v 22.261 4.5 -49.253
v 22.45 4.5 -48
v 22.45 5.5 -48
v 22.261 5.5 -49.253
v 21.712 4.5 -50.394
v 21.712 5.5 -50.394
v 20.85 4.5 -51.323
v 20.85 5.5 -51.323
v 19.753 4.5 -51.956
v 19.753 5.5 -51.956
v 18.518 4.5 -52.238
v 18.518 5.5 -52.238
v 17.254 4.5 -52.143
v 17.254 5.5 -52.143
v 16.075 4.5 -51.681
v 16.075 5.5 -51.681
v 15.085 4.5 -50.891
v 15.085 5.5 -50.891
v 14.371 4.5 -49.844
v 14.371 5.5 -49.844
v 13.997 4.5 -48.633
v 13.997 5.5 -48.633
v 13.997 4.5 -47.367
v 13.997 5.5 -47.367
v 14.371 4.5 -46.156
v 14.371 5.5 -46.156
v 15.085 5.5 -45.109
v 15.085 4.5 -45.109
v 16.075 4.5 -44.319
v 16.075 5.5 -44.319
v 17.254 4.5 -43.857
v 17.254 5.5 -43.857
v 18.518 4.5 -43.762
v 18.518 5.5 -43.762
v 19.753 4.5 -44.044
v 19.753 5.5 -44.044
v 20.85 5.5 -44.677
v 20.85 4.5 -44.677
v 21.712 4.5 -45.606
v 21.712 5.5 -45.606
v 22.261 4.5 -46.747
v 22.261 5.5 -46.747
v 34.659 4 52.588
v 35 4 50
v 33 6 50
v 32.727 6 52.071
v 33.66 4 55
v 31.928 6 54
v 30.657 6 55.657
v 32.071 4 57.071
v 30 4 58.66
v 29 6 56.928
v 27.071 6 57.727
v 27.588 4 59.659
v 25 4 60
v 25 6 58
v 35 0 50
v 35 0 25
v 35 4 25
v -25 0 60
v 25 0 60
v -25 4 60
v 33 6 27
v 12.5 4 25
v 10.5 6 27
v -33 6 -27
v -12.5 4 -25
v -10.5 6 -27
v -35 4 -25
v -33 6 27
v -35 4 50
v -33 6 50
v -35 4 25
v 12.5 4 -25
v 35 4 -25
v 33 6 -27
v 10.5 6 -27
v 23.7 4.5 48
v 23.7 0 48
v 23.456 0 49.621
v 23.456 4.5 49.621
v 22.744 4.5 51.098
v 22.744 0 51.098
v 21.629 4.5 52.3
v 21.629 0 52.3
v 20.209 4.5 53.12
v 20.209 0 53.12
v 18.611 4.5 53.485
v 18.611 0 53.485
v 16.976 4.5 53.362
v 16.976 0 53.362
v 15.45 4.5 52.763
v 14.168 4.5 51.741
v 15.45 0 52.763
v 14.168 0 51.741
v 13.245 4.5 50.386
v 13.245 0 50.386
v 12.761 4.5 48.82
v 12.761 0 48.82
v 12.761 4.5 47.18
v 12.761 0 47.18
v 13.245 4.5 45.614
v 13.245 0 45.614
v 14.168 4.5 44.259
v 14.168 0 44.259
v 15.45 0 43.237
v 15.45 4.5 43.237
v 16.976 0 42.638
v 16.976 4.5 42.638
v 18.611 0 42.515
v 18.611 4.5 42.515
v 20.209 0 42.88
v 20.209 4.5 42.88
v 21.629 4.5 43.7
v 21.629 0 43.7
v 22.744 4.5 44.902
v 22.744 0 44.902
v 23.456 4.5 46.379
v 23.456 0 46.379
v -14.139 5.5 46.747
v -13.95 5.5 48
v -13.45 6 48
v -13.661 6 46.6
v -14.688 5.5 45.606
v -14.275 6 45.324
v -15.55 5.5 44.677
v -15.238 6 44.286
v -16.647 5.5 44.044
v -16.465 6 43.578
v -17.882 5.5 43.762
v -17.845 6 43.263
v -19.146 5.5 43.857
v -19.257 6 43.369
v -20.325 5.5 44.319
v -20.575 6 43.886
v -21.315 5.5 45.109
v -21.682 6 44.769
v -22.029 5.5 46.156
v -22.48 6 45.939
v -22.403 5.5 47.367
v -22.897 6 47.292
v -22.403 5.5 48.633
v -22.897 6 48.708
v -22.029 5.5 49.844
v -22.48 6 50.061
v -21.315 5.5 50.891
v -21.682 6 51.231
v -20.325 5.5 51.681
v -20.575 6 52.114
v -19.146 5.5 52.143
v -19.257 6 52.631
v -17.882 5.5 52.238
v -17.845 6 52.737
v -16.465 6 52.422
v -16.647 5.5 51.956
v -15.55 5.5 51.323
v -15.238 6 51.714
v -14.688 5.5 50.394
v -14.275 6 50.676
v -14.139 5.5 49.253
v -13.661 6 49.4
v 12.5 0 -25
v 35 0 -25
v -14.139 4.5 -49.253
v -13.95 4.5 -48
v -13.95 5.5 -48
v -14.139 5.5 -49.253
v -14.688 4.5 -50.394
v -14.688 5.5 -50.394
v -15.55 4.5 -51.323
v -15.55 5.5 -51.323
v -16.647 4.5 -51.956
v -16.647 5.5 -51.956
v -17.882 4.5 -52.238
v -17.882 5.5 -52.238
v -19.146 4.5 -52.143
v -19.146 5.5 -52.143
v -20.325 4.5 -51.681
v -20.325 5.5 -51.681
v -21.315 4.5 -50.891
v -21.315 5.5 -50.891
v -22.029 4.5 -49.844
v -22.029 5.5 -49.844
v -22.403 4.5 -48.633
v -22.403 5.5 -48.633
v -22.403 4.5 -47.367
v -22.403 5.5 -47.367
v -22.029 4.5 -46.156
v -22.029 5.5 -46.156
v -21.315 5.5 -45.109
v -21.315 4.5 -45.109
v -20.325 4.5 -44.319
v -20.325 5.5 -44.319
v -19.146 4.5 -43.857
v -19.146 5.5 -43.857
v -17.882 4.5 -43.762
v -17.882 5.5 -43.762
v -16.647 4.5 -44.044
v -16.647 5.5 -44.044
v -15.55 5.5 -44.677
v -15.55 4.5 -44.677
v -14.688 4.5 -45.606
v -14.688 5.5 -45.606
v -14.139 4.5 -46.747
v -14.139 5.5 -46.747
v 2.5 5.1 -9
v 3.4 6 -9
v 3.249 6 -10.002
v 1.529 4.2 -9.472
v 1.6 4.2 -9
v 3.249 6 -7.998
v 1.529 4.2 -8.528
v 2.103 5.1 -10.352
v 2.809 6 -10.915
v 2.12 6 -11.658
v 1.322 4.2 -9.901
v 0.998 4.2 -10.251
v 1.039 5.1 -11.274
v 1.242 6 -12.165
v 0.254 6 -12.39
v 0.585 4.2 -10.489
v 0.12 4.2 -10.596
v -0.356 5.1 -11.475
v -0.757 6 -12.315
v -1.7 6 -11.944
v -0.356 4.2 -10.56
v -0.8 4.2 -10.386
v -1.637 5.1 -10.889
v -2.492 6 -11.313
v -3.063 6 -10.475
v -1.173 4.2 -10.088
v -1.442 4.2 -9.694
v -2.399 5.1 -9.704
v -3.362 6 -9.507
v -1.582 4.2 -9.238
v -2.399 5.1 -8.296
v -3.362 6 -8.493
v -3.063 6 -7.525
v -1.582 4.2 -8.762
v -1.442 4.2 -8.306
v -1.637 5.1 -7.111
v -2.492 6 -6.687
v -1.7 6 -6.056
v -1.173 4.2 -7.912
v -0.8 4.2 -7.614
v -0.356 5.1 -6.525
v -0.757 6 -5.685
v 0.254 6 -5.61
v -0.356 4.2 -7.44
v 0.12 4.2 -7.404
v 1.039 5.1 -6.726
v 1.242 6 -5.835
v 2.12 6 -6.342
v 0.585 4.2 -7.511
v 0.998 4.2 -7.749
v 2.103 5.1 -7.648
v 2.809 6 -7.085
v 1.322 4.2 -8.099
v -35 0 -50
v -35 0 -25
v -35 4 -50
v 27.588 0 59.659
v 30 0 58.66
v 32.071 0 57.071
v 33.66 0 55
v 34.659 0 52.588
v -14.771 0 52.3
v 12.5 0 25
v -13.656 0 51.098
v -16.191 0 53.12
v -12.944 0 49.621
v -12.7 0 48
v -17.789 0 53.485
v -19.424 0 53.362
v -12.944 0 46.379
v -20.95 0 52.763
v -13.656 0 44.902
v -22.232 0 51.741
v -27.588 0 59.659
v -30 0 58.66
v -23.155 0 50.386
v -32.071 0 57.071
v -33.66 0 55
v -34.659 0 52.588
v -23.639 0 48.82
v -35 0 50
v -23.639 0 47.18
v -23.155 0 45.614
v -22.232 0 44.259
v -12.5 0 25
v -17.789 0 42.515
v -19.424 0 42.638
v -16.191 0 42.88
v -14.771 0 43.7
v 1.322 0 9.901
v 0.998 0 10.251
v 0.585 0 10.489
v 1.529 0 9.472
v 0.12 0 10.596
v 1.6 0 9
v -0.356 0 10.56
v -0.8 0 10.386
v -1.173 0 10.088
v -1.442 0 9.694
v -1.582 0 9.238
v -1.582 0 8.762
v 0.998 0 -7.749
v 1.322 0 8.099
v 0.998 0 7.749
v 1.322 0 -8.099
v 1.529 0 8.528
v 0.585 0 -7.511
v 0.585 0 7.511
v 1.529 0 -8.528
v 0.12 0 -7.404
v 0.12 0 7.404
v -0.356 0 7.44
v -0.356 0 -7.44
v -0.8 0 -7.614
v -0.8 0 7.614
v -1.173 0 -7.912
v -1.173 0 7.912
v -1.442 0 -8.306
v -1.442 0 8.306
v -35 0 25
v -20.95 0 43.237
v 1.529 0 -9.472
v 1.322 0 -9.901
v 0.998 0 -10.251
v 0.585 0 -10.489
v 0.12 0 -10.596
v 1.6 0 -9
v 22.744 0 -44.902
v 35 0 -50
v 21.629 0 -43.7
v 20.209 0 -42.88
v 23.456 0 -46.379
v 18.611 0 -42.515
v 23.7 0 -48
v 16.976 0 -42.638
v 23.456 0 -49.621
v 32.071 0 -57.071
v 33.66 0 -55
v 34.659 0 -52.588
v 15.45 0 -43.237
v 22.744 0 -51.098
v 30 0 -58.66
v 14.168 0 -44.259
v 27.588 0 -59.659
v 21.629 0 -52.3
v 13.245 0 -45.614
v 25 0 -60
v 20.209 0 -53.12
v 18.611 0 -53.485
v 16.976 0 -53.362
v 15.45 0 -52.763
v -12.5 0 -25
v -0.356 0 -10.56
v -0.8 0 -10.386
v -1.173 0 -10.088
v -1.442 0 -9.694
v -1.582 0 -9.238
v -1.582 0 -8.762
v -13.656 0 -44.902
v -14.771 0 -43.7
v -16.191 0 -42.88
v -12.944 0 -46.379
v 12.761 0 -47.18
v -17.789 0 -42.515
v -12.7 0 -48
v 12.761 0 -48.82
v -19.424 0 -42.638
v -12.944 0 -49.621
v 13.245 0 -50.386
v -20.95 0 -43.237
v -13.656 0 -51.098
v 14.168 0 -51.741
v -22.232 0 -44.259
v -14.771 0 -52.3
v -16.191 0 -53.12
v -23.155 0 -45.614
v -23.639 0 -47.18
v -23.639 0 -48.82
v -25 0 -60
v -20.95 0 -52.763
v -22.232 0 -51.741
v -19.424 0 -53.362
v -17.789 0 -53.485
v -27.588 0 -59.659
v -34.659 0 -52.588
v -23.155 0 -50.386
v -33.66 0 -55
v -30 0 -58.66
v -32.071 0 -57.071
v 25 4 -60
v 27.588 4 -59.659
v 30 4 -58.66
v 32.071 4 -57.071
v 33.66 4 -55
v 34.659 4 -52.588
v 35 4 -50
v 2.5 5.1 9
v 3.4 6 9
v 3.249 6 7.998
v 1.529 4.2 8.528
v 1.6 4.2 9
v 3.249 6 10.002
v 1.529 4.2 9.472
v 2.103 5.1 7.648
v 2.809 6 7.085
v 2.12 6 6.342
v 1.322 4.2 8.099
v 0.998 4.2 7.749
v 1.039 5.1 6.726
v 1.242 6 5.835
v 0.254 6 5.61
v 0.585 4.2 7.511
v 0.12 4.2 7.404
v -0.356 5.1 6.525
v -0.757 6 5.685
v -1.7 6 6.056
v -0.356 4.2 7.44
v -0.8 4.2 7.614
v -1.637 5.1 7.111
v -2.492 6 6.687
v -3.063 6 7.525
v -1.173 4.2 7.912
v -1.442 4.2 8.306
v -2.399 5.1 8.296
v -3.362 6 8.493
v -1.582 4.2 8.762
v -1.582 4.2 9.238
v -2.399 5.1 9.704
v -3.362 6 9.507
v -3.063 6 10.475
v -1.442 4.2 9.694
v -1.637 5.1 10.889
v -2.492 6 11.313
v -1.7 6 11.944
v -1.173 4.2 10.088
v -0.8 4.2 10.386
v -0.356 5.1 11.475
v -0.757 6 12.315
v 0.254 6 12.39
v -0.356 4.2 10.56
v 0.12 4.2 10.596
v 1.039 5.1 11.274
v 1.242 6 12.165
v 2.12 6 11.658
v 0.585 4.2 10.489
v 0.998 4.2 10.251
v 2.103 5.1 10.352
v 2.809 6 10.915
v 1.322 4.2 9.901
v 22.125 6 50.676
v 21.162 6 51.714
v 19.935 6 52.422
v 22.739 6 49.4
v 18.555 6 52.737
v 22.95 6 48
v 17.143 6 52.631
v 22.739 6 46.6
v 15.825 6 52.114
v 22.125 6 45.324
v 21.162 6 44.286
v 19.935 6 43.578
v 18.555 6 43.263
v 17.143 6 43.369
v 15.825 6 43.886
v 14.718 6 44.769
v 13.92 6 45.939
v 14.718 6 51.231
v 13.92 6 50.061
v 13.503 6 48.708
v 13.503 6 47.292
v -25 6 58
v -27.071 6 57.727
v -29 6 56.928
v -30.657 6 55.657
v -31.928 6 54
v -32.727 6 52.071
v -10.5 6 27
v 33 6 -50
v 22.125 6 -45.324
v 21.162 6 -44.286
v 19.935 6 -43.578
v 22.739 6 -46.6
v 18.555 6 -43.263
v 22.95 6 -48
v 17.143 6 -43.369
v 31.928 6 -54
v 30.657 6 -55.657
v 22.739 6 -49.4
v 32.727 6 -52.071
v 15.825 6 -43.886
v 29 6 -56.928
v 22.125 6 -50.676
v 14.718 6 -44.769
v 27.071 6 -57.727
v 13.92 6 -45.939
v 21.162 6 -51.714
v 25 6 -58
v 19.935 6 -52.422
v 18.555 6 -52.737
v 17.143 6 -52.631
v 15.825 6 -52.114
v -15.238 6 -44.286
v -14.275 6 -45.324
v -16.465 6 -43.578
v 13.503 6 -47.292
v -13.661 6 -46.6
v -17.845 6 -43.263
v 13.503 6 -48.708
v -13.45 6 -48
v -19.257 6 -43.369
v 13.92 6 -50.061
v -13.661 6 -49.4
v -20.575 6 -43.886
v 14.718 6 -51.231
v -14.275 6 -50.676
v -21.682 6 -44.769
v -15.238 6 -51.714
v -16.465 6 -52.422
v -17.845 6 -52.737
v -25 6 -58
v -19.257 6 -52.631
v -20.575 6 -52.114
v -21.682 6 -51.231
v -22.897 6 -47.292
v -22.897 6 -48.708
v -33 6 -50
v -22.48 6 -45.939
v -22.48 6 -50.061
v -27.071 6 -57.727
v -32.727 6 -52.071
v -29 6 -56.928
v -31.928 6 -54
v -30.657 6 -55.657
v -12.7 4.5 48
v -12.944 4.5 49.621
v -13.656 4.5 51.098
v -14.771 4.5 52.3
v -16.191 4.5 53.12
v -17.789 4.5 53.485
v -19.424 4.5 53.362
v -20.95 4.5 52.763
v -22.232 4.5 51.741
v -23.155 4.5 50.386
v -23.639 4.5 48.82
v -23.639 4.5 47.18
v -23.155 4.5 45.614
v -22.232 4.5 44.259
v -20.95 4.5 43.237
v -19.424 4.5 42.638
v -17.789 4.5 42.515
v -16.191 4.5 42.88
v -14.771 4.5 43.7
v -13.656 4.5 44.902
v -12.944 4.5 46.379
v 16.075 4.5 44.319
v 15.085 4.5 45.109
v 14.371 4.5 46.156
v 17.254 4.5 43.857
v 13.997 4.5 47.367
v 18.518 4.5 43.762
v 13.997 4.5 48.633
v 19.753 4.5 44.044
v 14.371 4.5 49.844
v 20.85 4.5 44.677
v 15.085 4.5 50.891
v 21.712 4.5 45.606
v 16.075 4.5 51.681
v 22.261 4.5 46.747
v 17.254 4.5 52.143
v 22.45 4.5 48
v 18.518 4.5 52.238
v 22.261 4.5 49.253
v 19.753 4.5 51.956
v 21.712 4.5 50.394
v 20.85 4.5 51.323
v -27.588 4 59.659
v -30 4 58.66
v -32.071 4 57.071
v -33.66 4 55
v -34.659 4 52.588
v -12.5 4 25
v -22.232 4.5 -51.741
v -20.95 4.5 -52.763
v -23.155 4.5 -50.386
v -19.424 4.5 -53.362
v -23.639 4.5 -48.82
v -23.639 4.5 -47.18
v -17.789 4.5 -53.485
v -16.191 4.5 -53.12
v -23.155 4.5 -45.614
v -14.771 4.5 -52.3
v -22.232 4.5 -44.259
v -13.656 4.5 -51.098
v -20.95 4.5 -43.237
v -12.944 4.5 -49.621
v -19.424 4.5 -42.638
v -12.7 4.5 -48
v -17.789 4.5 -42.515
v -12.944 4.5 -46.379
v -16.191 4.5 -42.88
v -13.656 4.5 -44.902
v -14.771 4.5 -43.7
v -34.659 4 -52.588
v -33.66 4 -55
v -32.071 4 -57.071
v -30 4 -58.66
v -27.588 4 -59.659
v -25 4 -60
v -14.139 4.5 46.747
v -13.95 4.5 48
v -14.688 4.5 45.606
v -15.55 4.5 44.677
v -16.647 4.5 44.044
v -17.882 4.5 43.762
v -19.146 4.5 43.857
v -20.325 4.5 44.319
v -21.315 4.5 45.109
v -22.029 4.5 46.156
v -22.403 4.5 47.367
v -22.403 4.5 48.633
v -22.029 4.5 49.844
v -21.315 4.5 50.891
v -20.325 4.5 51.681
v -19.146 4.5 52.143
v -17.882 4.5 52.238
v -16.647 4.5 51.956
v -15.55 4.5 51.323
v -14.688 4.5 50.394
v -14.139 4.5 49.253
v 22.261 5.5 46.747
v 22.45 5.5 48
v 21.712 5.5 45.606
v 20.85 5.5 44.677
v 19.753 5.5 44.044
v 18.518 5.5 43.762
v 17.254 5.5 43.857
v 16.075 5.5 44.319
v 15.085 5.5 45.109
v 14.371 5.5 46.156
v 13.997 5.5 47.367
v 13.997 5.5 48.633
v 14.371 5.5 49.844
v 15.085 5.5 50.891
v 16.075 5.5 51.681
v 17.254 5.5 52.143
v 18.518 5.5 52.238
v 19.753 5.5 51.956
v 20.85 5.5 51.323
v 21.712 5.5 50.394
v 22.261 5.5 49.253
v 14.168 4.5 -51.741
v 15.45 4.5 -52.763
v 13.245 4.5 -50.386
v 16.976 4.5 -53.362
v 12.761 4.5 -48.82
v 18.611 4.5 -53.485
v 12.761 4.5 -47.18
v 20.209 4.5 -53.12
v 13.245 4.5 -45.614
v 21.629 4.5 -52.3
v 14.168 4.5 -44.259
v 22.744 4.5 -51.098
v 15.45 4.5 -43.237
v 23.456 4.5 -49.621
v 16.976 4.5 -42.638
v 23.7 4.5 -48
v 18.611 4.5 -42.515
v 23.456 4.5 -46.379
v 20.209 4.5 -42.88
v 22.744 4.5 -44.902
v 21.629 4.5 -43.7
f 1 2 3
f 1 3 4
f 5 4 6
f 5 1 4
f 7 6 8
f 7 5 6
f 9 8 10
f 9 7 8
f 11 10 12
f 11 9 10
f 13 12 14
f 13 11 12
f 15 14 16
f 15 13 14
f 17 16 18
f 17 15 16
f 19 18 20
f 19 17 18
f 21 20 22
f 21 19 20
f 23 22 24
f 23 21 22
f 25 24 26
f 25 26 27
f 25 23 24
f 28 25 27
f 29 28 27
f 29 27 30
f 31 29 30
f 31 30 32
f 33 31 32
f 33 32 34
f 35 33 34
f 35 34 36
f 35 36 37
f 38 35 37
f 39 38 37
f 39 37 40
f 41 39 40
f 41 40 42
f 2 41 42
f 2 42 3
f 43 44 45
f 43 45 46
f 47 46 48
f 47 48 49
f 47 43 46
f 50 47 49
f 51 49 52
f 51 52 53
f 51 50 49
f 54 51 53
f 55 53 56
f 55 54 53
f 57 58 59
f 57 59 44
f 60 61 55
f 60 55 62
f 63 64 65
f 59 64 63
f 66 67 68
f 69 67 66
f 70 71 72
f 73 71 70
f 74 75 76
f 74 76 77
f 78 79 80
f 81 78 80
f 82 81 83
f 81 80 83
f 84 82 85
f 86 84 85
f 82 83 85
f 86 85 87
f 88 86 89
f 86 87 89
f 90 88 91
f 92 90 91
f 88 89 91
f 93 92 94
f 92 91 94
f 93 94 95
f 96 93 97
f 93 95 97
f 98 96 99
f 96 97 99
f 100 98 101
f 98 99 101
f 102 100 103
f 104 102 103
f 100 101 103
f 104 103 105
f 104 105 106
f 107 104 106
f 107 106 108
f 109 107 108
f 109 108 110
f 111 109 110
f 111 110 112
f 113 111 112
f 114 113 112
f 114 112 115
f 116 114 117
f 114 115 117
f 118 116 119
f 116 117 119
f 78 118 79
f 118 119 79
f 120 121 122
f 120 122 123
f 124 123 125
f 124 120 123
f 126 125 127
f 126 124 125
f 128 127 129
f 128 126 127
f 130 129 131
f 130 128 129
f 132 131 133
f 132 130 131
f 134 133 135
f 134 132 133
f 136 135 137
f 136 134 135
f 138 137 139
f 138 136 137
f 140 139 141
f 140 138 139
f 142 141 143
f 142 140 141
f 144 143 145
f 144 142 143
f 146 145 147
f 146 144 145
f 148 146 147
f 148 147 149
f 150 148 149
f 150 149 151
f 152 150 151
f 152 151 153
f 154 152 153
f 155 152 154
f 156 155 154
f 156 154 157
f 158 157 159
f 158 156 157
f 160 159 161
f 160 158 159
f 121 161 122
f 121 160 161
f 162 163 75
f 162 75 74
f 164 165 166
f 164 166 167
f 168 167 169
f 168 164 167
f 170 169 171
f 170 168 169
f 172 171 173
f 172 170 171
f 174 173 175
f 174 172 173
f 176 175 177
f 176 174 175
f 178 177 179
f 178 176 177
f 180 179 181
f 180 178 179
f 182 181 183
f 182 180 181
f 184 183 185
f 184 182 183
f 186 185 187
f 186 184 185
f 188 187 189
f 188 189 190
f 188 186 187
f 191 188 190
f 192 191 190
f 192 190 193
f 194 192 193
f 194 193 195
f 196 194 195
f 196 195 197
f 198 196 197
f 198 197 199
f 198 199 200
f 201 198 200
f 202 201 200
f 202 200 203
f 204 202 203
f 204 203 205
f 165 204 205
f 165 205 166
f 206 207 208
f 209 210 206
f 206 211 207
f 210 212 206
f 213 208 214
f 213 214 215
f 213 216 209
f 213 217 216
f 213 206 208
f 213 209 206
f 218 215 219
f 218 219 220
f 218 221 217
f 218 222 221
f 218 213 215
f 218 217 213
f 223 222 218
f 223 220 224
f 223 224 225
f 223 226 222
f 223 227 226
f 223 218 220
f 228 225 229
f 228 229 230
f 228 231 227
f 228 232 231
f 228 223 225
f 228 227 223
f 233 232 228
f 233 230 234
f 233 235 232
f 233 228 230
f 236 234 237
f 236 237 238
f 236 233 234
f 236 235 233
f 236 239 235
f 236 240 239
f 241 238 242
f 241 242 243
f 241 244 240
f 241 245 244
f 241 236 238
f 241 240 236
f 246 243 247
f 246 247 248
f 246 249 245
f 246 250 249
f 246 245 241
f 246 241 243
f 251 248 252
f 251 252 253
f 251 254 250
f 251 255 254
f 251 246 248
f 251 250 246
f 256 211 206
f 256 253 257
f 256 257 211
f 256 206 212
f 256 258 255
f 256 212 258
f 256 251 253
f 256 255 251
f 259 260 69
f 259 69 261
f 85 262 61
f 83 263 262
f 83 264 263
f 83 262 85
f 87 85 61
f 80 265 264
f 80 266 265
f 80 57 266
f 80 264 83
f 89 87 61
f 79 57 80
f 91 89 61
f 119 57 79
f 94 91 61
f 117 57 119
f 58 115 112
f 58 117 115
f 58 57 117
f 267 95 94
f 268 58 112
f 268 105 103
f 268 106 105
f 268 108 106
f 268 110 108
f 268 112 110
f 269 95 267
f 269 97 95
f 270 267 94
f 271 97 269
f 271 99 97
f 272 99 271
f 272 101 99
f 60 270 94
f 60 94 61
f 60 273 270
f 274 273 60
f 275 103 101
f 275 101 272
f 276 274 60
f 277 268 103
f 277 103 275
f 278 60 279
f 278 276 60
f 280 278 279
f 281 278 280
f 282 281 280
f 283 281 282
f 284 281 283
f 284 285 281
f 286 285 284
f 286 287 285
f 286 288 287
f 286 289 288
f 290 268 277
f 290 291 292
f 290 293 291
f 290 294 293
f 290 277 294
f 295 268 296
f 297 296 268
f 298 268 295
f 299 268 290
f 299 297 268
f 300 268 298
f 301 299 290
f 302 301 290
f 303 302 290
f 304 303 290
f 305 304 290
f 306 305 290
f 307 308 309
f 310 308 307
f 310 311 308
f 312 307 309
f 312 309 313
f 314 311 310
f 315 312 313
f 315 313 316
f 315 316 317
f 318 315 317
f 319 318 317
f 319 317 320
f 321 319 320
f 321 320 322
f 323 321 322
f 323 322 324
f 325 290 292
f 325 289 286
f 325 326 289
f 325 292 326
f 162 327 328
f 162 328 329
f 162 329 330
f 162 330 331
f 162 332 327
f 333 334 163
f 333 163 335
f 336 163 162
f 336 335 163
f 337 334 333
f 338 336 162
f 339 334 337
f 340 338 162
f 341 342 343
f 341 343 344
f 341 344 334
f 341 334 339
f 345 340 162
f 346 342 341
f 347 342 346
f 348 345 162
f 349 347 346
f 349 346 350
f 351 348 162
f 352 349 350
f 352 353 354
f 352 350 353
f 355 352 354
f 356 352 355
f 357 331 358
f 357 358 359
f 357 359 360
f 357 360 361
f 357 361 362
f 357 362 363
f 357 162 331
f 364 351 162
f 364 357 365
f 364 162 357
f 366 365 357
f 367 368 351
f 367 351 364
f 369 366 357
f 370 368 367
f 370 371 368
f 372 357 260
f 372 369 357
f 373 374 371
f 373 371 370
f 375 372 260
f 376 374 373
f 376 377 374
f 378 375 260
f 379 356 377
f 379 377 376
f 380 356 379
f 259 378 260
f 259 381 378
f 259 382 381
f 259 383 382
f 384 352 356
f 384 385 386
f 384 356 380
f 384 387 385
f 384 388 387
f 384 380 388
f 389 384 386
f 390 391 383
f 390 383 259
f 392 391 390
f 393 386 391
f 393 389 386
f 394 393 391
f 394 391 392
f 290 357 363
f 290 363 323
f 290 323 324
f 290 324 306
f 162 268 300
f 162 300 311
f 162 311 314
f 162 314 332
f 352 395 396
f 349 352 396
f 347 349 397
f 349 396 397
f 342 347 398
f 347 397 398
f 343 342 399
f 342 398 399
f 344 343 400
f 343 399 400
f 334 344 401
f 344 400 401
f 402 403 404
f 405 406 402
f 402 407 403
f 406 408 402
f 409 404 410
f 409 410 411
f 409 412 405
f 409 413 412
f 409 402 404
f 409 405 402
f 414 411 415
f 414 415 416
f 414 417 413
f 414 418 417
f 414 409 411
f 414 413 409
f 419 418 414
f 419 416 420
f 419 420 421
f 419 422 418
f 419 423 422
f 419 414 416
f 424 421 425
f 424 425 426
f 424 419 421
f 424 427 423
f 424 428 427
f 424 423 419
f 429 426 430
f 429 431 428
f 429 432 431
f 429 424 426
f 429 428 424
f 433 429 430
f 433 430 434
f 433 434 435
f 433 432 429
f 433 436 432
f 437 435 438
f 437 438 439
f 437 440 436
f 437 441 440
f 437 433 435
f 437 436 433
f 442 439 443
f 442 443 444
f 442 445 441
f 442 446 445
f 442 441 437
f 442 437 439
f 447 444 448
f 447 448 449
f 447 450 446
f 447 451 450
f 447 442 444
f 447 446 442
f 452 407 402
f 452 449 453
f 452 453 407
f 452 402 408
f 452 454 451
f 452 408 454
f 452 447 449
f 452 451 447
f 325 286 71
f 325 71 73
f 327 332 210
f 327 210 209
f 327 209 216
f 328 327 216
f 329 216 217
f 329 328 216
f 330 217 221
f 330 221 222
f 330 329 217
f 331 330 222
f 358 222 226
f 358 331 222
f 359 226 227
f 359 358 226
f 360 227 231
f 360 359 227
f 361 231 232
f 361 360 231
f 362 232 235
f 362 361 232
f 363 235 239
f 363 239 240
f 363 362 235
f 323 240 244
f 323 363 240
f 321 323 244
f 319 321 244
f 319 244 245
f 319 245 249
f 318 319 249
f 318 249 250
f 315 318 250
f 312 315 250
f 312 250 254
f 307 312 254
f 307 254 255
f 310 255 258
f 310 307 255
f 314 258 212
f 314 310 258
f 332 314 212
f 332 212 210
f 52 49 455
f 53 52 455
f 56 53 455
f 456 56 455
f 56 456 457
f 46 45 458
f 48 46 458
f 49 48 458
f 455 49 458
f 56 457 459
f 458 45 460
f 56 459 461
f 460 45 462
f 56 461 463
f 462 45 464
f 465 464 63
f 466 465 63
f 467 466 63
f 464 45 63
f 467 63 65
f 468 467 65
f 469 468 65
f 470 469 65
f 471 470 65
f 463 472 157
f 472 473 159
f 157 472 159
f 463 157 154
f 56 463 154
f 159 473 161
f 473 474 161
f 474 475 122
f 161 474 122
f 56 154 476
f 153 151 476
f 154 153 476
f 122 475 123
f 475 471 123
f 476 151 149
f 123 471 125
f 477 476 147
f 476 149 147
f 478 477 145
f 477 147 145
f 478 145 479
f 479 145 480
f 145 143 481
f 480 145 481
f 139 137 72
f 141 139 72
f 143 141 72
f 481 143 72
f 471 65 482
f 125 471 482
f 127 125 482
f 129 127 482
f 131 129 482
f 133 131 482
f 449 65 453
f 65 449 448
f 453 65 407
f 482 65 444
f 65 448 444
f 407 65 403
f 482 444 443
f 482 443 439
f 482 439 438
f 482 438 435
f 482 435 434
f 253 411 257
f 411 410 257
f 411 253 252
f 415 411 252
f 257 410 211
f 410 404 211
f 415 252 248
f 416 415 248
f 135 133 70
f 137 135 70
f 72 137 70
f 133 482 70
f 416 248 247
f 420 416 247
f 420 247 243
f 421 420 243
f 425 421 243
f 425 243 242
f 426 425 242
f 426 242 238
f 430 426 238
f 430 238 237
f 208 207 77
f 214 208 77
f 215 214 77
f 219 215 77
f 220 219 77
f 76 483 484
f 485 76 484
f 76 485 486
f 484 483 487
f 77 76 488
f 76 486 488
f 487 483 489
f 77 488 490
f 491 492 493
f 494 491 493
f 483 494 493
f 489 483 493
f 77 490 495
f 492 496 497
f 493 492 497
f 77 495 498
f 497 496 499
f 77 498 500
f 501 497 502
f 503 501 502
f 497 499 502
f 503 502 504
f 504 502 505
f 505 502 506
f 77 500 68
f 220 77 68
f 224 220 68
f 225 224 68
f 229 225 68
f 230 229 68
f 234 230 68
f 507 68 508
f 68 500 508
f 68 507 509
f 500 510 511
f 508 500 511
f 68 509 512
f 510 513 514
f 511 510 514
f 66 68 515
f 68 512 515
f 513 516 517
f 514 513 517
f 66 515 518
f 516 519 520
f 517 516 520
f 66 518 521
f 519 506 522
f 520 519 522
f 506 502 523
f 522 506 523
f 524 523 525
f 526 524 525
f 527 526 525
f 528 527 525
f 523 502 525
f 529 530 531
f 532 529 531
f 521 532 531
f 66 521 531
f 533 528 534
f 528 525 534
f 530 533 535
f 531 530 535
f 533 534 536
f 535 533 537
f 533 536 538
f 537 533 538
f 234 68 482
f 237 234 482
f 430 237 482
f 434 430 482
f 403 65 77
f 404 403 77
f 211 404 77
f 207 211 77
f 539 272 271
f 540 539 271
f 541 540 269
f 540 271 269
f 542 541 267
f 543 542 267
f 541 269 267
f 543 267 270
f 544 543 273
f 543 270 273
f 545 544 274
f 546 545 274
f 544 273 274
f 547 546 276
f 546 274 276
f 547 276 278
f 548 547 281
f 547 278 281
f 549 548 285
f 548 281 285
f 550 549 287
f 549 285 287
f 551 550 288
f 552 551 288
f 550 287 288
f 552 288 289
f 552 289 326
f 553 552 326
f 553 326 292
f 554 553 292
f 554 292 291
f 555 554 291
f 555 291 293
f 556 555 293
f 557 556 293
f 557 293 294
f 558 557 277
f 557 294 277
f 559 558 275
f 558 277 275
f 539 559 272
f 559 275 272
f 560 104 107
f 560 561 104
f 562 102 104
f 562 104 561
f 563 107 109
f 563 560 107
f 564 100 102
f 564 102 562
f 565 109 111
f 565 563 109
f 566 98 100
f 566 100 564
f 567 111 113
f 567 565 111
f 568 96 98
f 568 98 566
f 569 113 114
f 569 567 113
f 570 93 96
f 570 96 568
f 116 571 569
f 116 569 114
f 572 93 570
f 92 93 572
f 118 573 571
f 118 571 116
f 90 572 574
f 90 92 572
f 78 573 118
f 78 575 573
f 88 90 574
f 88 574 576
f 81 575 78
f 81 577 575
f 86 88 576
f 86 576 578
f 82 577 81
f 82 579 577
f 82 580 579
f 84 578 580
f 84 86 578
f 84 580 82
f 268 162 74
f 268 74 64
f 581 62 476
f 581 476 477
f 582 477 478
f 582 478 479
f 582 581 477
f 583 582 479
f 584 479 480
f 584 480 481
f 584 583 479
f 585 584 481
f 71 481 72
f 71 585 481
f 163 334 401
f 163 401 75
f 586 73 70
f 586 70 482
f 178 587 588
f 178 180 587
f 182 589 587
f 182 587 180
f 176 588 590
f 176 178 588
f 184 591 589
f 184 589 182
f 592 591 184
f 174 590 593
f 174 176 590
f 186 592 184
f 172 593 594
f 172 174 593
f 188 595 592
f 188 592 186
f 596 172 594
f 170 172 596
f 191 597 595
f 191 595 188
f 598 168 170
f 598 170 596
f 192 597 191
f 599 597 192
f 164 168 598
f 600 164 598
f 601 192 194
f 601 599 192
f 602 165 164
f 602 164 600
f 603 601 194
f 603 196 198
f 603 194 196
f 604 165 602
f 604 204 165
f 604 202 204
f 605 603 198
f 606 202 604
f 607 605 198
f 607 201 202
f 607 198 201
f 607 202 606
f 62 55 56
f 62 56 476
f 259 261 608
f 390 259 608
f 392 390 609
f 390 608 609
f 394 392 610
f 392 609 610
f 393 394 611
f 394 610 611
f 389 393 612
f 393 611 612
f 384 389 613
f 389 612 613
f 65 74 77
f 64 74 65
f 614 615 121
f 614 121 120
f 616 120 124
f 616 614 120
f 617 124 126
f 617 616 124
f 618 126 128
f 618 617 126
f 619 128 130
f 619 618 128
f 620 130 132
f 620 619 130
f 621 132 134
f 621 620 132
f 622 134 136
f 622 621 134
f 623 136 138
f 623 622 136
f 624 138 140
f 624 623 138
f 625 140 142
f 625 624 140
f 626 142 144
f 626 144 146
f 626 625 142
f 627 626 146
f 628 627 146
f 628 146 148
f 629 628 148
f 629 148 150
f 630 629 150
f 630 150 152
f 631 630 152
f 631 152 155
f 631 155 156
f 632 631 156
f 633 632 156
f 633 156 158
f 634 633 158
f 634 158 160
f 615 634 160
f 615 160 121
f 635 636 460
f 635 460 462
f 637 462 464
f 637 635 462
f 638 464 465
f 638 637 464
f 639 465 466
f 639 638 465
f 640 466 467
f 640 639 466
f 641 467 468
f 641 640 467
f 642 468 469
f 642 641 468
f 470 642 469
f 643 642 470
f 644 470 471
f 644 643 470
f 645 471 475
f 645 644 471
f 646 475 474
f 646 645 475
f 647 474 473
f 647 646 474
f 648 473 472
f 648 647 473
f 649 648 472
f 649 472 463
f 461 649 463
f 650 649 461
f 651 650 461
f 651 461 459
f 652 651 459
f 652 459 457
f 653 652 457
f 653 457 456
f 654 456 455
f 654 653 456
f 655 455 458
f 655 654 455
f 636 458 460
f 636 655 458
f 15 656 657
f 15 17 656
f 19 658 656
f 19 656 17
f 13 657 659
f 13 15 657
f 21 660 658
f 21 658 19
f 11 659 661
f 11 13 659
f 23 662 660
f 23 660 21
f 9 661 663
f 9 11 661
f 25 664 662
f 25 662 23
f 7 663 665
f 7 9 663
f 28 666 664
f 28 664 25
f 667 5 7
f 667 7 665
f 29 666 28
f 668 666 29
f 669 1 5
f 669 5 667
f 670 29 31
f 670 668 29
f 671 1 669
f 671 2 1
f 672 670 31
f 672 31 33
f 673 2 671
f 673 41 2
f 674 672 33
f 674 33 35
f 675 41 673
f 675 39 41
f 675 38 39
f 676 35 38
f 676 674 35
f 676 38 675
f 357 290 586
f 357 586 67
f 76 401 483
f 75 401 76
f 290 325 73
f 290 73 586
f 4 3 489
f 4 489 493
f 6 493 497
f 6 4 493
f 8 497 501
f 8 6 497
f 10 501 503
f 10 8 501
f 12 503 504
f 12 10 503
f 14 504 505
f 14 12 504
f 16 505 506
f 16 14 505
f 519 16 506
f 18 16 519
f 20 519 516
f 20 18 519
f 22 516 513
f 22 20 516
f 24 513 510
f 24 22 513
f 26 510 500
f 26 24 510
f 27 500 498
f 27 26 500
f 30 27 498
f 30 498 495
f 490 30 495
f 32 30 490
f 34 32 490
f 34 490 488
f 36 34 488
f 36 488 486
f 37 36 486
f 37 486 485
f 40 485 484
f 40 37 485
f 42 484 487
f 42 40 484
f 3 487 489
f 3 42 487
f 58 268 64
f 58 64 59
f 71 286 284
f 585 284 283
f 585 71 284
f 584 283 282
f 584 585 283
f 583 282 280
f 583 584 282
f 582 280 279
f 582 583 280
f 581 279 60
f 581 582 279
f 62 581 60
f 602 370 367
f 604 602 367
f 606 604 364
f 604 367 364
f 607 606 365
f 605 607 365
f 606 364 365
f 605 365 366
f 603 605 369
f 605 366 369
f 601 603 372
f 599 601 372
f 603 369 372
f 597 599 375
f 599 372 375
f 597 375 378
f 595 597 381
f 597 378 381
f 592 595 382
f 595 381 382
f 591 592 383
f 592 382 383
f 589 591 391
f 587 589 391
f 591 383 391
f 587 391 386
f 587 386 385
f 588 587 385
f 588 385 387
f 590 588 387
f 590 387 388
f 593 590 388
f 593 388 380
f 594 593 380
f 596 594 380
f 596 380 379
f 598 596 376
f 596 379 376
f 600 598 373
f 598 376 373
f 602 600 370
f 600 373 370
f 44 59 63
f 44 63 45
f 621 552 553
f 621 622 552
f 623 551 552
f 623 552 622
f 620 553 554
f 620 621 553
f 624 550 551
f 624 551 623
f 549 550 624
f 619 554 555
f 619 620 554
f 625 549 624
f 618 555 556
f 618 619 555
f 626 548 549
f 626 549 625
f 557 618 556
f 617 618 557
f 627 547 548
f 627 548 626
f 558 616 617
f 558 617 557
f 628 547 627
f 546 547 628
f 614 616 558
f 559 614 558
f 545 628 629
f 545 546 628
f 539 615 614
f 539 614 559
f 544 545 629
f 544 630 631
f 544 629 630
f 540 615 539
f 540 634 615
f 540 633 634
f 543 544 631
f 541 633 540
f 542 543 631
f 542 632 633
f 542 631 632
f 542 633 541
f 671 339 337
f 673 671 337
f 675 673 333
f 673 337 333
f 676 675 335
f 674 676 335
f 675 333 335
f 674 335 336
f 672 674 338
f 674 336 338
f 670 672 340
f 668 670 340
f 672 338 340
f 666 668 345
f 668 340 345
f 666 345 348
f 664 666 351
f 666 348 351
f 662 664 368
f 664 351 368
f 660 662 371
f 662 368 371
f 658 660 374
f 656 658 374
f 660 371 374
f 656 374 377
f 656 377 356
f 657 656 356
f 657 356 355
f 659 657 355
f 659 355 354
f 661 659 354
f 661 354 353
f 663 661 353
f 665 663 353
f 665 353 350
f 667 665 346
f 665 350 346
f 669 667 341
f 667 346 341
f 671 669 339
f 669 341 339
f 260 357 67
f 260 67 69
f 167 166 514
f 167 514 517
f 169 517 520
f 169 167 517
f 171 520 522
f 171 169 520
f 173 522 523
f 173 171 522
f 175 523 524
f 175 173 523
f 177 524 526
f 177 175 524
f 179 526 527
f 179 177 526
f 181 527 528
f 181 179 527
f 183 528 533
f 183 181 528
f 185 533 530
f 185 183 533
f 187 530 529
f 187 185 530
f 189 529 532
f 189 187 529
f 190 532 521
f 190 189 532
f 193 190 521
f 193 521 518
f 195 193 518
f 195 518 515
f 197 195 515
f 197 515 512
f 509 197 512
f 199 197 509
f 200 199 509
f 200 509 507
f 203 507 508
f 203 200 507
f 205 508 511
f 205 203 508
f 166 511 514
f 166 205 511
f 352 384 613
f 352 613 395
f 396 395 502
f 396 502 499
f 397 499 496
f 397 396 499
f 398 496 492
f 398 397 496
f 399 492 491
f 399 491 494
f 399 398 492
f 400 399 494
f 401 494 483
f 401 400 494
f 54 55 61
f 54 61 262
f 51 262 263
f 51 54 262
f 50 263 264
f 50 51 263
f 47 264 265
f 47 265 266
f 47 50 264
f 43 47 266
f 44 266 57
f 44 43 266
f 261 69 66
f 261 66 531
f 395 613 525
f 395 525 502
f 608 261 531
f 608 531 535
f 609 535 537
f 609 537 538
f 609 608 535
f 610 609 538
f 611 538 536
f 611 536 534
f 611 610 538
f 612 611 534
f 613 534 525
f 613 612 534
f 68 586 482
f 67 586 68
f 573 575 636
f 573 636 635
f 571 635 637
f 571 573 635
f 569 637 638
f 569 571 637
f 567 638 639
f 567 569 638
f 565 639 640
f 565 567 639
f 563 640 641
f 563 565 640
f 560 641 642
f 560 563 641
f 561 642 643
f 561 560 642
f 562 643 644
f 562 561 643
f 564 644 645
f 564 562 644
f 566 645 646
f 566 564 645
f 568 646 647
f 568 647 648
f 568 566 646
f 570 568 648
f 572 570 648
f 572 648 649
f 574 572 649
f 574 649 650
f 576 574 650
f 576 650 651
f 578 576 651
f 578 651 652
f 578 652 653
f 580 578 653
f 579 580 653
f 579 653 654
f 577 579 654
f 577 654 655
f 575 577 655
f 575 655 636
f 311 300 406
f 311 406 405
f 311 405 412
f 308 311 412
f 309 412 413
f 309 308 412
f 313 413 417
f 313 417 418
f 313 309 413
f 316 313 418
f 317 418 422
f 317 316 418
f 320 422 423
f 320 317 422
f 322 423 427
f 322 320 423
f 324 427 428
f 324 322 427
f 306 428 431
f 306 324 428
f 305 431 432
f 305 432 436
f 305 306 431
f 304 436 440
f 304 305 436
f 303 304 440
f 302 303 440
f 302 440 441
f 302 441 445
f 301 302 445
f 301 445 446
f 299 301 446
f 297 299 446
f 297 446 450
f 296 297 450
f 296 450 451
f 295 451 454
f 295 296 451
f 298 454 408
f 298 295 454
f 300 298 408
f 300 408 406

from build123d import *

# Parameters (mm, degrees)
ESQUISSE2_R             = 4.25
ESQUISSE2_R_2           = 1.6
BOSS_EXTRU_1_DEPTH      = 6
CONG_1_R                = 10
CHANFREIN1_SIZE         = 1.8
CHANFREIN2_SIZE         = 2
ESQUISSE3_R             = 5.5
ENL_V_MAT_EXTRU_1_DEPTH = 4.5
CHANFREIN3_SIZE         = 0.5


with BuildPart() as part:
    # Esquisse2 → Boss.-Extru.1 (new body)
    with BuildSketch(Plane(origin=(0, 0, 0), x_dir=(1, 0, 0), z_dir=(0, 1, 0))):
        Polygon((-12.5, -25), (-12.5, 25), (-35, 25), (-35, 60), (35, 60), (35, 25), (12.5, 25), (12.5, -25), (35, -25), (35, -60), (-35, -60), (-35, -25), align=None)
        with Locations((-18.2, 48)):
            Circle(ESQUISSE2_R, mode=Mode.SUBTRACT)
        with Locations((18.2, 48)):
            Circle(ESQUISSE2_R, mode=Mode.SUBTRACT)
        with Locations((18.2, -48)):
            Circle(ESQUISSE2_R, mode=Mode.SUBTRACT)
        with Locations((-18.2, -48)):
            Circle(ESQUISSE2_R, mode=Mode.SUBTRACT)
        with Locations((0, 9)):
            Circle(ESQUISSE2_R_2, mode=Mode.SUBTRACT)
        with Locations((0, -9)):
            Circle(ESQUISSE2_R_2, mode=Mode.SUBTRACT)
    extrude(amount=BOSS_EXTRU_1_DEPTH)

    # Congé1
    cong_1_edges = [part.edges().sort_by_distance(p)[0] for p in [
        (-35, 3, -60),
        (35, 3, -60),
        (35, 3, 60),
        (-35, 3, 60),
    ]]
    fillet(cong_1_edges, radius=CONG_1_R)

    # Chanfrein1
    chanfrein1_edges = [part.edges().sort_by_distance(p)[0] for p in [
        (-1.6, 6, -9),
        (-1.6, 6, 9),
    ]]
    chamfer(chanfrein1_edges, length=CHANFREIN1_SIZE)

    # Chanfrein2
    chanfrein2_edges = [part.edges().sort_by_distance(p)[0] for p in [
        (-23.75, 6, 25),
        (-35, 6, 37.5),
        (23.75, 6, 25),
        (12.5, 6, 0),
        (23.75, 6, -25),
        (35, 6, -37.5),
        (-23.75, 6, -25),
        (0, 6, 60),
        (35, 6, 37.5),
        (0, 6, -60),
        (-35, 6, -37.5),
        (-32.071067812, 6, -57.071067812),
        (32.071067812, 6, -57.071067812),
        (32.071067812, 6, 57.071067812),
        (-32.071067812, 6, 57.071067812),
        (-12.5, 6, 0),
    ]]
    chamfer(chanfrein2_edges, length=CHANFREIN2_SIZE)

    # Esquisse3 → Enlèv. mat.-Extru.1 (cut)
    with BuildSketch(Plane.XZ):
        with Locations((-18.2, 48)):
            Circle(ESQUISSE3_R)
        with Locations((18.2, 48)):
            Circle(ESQUISSE3_R)
        with Locations((18.2, -48)):
            Circle(ESQUISSE3_R)
        with Locations((-18.2, -48)):
            Circle(ESQUISSE3_R)
    extrude(amount=-ENL_V_MAT_EXTRU_1_DEPTH, mode=Mode.SUBTRACT)

    # Chanfrein3
    chanfrein3_edges = [part.edges().sort_by_distance(p)[0] for p in [
        (-22.45, 6, -48),
        (13.95, 6, -48),
        (13.95, 6, 48),
        (-22.45, 6, 48),
    ]]
    chamfer(chanfrein3_edges, length=CHANFREIN3_SIZE)


solid = part.part
